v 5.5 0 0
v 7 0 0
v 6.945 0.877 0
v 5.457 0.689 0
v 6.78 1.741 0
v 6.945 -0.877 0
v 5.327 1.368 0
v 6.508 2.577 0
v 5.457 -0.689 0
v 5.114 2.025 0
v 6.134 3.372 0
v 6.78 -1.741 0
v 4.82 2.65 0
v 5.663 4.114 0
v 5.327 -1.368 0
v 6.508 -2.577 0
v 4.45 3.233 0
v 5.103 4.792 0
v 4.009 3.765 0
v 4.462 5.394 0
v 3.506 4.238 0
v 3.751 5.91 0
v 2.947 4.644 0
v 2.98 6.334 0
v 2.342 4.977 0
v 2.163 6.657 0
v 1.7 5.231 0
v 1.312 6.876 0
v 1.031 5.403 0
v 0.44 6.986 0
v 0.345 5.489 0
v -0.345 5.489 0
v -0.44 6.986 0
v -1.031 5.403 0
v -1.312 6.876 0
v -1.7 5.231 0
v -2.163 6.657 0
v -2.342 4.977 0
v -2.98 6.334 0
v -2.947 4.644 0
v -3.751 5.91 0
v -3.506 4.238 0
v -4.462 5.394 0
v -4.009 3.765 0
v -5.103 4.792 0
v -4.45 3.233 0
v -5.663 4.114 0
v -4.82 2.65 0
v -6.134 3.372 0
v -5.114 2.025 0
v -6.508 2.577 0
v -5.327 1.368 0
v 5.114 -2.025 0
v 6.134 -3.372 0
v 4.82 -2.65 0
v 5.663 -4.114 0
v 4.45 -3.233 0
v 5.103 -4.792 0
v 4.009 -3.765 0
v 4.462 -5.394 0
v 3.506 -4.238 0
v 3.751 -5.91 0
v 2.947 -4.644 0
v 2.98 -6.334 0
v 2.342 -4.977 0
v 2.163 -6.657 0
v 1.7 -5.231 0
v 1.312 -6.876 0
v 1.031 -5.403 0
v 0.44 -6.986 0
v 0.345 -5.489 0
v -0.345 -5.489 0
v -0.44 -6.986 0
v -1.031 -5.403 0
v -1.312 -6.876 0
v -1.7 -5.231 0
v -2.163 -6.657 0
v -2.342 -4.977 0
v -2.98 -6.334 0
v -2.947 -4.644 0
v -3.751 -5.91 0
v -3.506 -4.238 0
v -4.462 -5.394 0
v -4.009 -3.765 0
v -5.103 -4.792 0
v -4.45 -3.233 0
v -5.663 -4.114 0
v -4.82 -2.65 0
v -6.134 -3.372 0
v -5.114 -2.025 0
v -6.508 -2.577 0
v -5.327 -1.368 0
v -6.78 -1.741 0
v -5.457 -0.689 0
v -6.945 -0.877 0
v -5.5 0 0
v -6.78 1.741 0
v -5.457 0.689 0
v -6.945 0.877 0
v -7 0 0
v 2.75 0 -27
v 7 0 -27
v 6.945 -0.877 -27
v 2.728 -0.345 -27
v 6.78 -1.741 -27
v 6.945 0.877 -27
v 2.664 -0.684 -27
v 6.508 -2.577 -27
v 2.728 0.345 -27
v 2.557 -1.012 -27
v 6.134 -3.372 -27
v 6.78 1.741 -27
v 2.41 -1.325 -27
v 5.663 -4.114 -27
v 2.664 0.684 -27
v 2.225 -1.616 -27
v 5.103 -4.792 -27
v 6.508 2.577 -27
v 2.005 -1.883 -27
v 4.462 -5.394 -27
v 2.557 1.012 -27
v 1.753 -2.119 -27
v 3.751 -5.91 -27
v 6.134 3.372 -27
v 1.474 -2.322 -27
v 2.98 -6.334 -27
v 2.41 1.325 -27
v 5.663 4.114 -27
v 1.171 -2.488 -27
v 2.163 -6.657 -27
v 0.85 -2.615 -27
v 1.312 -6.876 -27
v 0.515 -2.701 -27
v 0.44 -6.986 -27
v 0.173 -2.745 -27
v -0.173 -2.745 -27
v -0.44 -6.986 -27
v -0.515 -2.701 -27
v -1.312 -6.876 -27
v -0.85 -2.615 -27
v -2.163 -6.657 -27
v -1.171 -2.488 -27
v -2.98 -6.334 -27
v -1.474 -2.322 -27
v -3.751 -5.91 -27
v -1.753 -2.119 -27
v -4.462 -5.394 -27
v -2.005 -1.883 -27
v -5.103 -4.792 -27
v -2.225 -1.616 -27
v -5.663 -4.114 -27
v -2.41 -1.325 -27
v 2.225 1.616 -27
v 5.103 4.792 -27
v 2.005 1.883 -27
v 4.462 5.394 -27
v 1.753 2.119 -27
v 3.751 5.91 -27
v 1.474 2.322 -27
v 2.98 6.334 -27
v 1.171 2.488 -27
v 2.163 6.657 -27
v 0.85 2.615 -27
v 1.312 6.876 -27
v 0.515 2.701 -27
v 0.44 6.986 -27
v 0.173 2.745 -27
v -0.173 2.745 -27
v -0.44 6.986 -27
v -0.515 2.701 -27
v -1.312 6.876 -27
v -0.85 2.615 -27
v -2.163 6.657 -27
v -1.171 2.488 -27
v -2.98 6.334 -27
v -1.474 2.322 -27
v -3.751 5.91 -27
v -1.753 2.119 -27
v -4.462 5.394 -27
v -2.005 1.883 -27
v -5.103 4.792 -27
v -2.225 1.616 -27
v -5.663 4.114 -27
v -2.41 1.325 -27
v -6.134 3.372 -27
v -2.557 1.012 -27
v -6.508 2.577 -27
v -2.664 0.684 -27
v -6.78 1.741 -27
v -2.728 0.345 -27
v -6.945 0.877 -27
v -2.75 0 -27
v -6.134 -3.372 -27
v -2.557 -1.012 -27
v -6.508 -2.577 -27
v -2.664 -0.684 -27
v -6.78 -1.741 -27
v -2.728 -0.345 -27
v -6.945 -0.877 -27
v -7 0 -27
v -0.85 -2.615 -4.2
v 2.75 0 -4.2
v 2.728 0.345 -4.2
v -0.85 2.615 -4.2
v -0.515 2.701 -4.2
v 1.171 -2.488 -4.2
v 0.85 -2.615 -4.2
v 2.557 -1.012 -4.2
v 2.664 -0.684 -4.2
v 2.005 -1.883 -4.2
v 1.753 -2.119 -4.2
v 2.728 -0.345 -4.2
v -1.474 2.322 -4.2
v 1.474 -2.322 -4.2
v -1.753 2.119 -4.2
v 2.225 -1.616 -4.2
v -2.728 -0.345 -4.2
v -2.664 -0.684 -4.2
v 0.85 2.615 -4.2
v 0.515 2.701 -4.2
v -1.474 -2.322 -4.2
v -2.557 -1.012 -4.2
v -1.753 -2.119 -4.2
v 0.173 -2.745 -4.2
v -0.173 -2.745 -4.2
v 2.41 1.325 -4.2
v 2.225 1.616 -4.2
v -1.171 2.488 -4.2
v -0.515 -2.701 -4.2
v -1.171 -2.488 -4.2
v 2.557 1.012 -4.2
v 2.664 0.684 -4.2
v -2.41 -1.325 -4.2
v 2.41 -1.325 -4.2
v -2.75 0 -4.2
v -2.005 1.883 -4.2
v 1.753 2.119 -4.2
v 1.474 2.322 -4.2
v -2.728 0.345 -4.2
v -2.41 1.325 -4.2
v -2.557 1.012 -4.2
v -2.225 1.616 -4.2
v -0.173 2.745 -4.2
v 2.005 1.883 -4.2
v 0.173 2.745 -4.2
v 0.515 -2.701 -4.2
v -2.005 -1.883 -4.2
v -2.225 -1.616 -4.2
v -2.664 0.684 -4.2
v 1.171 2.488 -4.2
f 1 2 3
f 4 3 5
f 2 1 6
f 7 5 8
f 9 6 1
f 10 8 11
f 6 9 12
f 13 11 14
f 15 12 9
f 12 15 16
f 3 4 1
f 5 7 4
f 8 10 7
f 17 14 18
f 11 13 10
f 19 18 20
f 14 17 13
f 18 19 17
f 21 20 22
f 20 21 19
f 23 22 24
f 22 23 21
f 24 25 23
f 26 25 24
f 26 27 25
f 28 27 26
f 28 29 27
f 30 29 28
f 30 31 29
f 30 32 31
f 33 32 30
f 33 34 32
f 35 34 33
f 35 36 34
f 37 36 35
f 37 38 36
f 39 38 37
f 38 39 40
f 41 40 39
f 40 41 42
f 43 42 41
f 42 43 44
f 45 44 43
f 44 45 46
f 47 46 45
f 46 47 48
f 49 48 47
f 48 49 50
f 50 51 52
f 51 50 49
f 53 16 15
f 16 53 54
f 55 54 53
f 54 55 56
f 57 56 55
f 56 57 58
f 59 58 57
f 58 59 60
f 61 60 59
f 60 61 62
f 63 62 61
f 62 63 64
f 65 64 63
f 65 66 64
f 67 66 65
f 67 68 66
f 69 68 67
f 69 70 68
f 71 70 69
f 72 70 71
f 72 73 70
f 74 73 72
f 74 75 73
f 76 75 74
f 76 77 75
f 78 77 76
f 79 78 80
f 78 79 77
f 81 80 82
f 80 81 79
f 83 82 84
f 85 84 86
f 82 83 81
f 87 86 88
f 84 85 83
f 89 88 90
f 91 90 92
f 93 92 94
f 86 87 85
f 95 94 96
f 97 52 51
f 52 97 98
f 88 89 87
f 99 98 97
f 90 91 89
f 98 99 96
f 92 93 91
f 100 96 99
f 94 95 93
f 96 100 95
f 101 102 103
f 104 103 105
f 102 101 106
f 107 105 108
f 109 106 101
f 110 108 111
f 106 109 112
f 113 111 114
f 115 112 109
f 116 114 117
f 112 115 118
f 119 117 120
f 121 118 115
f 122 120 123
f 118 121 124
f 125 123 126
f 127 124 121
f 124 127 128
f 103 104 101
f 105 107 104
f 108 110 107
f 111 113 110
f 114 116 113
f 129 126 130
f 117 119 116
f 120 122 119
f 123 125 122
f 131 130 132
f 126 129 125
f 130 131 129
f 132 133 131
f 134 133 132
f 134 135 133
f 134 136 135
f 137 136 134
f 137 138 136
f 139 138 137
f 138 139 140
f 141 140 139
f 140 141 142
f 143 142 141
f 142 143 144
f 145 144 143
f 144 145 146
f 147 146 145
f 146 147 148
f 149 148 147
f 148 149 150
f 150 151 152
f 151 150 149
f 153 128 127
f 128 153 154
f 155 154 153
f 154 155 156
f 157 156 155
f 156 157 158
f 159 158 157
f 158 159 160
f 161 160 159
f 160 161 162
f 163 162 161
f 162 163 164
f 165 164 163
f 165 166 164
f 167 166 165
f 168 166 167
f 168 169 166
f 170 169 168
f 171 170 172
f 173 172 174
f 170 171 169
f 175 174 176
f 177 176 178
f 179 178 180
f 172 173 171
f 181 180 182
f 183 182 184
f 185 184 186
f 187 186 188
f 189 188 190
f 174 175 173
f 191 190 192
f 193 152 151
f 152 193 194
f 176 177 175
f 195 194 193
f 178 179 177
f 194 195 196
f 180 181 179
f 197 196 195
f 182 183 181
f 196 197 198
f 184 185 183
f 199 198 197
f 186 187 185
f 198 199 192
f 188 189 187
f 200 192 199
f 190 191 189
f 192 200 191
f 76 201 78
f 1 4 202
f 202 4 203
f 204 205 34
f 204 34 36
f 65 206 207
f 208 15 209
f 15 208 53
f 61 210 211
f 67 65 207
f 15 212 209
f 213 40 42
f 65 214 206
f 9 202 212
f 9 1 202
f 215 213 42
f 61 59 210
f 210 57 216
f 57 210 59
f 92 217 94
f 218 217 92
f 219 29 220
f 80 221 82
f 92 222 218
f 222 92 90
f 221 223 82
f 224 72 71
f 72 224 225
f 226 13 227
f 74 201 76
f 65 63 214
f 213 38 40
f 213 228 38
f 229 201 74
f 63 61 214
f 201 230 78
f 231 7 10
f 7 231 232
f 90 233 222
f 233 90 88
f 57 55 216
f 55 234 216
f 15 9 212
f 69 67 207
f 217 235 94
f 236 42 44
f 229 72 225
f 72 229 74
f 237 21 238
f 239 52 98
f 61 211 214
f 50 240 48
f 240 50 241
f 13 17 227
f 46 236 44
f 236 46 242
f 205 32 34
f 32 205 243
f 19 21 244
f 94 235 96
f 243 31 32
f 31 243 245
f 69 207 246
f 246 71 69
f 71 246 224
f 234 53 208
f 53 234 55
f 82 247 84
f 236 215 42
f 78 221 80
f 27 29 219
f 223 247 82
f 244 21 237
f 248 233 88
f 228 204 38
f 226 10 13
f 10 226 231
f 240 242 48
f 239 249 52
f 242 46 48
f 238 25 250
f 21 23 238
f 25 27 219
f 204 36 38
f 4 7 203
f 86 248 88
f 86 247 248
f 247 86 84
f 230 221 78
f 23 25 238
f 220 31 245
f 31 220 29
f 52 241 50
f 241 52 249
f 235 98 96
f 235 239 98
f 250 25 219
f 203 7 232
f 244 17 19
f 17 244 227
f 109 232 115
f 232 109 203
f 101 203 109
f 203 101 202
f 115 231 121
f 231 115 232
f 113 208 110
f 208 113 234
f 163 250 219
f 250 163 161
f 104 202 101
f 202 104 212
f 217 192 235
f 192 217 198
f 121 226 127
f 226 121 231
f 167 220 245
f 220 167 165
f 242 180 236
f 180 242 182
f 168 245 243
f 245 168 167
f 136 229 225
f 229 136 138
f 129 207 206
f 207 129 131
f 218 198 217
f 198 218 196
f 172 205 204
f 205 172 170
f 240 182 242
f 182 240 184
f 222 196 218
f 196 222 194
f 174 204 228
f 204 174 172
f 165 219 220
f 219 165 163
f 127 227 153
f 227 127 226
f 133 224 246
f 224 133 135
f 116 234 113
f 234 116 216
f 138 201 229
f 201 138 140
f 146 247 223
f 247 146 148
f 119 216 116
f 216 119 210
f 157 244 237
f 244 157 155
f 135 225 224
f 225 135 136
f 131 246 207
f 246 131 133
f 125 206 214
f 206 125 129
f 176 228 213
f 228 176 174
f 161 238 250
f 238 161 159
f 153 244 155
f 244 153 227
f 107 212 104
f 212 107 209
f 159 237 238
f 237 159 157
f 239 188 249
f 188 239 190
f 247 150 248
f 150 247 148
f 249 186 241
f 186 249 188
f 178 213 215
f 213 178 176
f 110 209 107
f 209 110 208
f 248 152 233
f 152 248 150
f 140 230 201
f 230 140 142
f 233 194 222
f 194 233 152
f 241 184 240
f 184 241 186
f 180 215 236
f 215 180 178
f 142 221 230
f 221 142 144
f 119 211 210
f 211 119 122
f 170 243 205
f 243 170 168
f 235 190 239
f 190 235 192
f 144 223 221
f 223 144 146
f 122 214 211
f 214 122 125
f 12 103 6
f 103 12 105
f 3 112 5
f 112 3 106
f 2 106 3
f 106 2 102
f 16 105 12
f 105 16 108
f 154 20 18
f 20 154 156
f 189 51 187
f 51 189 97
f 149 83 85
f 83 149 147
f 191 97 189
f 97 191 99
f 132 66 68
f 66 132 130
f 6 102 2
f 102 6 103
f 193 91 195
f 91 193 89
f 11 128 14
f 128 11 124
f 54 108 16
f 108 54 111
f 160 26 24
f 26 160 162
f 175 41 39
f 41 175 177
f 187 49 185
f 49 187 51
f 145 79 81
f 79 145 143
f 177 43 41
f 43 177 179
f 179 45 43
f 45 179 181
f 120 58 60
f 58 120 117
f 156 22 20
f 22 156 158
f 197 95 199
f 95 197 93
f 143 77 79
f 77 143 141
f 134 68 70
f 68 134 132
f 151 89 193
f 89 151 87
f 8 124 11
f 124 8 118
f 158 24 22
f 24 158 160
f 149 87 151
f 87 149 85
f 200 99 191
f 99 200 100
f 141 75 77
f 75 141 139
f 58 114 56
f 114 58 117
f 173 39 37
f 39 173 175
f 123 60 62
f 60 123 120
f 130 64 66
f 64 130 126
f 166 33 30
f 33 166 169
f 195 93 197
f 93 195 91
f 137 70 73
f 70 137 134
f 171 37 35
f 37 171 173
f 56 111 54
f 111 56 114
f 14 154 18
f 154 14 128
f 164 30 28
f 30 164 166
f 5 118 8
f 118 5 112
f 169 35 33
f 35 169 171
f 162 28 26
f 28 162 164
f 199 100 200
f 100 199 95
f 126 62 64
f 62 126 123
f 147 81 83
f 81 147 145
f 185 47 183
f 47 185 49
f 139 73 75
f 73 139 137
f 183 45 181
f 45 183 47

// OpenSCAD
$fn = 50;


difference() {
	union() {
		translate(v = [0, 0, -27.0000000000]) {
			cylinder(h = 27, r = 7.0000000000);
		}
		cylinder(h = 0, r = 13.0000000000);
	}
	union() {
		translate(v = [0, 0, 0]) {
			rotate(a = [0, 0, 0]) {
				difference() {
					union() {
						#translate(v = [0, 0, -27.0000000000]) {
							cylinder(h = 27, r = 2.2500000000);
						}
						#translate(v = [0, 0, -4.2000000000]) {
							cylinder(h = 4.2000000000, r = 7.0000000000, r1 = 2.7500000000, r2 = 5.5000000000);
						}
						#translate(v = [0, 0, -27.0000000000]) {
							cylinder(h = 27, r = 2.7500000000);
						}
						#translate(v = [0, 0, -27.0000000000]) {
							cylinder(h = 27, r = 2.2500000000);
						}
					}
					union();
				}
			}
		}
	}
}
